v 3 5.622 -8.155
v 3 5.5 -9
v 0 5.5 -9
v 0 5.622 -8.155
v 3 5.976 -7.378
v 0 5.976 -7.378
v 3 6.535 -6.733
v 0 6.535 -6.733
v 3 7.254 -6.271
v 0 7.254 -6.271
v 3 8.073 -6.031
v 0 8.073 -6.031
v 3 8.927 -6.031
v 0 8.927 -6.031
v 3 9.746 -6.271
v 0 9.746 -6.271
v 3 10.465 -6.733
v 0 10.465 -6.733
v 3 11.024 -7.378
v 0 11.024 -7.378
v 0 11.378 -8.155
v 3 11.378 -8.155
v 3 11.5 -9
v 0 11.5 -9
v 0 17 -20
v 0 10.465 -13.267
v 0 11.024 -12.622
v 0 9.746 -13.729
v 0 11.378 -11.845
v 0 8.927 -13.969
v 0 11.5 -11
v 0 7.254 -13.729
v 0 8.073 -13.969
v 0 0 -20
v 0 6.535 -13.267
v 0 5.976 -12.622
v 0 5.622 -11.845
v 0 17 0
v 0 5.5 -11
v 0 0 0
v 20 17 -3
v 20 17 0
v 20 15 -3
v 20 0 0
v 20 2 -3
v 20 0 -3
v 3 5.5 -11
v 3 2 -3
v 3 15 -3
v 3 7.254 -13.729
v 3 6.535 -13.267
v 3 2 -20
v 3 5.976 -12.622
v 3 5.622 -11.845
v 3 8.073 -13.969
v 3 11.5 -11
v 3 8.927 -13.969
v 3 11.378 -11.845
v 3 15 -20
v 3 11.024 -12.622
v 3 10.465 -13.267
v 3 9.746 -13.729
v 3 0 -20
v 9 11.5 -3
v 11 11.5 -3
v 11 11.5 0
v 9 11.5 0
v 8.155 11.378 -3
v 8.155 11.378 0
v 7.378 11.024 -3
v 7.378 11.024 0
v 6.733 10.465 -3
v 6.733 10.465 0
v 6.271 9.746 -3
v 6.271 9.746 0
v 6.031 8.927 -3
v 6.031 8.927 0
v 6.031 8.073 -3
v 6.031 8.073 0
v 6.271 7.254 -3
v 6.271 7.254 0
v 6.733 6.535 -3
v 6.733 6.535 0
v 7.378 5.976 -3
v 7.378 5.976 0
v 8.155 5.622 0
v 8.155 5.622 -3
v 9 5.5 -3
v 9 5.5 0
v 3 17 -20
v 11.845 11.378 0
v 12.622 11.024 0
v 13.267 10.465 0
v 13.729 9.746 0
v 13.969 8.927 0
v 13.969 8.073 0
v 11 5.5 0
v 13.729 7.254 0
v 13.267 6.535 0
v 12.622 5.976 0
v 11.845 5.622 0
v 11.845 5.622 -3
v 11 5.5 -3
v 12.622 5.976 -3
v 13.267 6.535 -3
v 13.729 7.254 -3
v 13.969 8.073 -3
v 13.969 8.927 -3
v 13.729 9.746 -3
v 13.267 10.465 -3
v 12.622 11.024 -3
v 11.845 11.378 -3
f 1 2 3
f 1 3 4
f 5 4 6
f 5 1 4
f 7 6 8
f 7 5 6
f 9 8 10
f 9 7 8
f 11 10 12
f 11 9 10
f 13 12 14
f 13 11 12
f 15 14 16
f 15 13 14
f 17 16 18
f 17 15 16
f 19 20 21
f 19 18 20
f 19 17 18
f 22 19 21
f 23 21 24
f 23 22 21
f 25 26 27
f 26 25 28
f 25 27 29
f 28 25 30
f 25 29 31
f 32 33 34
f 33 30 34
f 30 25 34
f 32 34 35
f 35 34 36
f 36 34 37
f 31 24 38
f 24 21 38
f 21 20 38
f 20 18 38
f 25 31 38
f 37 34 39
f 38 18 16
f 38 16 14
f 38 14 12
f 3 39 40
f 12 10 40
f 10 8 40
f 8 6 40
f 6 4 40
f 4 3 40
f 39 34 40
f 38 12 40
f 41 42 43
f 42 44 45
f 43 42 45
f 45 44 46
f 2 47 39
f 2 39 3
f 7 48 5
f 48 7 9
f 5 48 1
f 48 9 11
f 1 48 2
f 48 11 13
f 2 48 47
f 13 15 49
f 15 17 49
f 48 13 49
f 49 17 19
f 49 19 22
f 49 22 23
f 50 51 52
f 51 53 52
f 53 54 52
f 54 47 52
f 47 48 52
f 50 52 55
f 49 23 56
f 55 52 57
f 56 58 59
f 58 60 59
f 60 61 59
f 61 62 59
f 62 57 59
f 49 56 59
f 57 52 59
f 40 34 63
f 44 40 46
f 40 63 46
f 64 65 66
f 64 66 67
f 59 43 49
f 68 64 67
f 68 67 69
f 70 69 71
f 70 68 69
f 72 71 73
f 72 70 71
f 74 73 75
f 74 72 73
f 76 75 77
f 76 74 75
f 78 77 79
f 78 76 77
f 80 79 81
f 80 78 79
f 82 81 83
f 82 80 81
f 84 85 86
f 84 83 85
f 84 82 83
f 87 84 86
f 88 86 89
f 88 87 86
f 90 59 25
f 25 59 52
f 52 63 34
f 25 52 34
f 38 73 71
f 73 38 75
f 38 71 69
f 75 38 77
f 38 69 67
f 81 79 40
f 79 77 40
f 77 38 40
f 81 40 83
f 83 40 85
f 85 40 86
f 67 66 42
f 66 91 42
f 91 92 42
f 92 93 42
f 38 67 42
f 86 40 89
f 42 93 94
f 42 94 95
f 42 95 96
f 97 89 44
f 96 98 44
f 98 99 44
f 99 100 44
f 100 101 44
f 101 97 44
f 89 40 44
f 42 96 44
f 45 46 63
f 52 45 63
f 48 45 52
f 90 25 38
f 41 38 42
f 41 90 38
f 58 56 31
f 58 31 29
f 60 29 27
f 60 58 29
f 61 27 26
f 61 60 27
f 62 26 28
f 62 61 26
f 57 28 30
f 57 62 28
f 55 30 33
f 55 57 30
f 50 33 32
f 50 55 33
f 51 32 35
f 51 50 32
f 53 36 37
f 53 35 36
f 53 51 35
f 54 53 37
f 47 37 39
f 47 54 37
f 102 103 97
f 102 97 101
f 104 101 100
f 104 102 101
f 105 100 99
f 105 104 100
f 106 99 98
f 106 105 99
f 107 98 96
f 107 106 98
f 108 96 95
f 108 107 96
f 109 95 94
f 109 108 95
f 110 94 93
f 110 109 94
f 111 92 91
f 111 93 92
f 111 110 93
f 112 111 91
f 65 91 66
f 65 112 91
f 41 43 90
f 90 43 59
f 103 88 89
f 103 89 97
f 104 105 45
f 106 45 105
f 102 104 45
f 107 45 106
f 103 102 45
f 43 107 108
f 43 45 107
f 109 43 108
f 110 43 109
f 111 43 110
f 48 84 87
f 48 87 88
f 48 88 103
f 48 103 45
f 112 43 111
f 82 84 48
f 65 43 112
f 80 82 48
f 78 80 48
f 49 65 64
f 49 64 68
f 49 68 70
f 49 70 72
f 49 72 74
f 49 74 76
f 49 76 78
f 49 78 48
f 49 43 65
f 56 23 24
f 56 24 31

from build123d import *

# Parameters (mm, degrees)
BOSS_EXTRUDE1_DEPTH = 17
SKETCH2_W           = 17
SKETCH2_H           = 13
CUT_EXTRUDE1_DEPTH  = 17
CUT_EXTRUDE2_REACH  = 5
CUT_EXTRUDE3_REACH  = 5


with BuildPart() as part:
    # Sketch1 → Boss-Extrude1 (new body)
    with BuildSketch(Plane(origin=(0, 0, 0), x_dir=(1, 0, 0), z_dir=(0, 1, 0))):
        Polygon((0, 0), (20, 0), (20, 3), (3, 20), (0, 20), align=None)
    extrude(amount=BOSS_EXTRUDE1_DEPTH)

    # Sketch2 → Cut-Extrude1 (cut)
    with BuildSketch(Plane(origin=(0, 0, -20), x_dir=(-1, 0, 0), z_dir=(0, 0, -1))):
        with Locations((-11.5, 8.5)):
            Rectangle(SKETCH2_W, SKETCH2_H)
    extrude(amount=-CUT_EXTRUDE1_DEPTH, mode=Mode.SUBTRACT)

    # Sketch3 → Cut-Extrude2 (cut, up to next)
    with BuildSketch(Plane(origin=(3, 0, 0), x_dir=(0, 0, -1), z_dir=(1, 0, 0)), mode=Mode.PRIVATE) as cut_extrude2_sk1:
        with BuildLine():
            Line((9, 11.5), (11, 11.5))
            ThreePointArc((11, 11.5), (14, 8.5), (11, 5.5))
            Line((11, 5.5), (9, 5.5))
            ThreePointArc((9, 5.5), (6, 8.5), (9, 11.5))
        make_face()
    cut_extrude2_tool1 = extrude(cut_extrude2_sk1.sketch, amount=-CUT_EXTRUDE2_REACH, mode=Mode.PRIVATE) & part.part
    add(cut_extrude2_tool1.solids().sort_by_distance((3, 8.5, -10))[0], mode=Mode.SUBTRACT)

    # Sketch4 → Cut-Extrude3 (cut, up to next)
    with BuildSketch(Plane(origin=(0, 0, -3), x_dir=(-1, 0, 0), z_dir=(0, 0, -1)), mode=Mode.PRIVATE) as cut_extrude3_sk1:
        with BuildLine():
            Line((-11, 11.5), (-9, 11.5))
            ThreePointArc((-9, 11.5), (-6, 8.5), (-9, 5.5))
            Line((-9, 5.5), (-11, 5.5))
            ThreePointArc((-11, 5.5), (-14, 8.5), (-11, 11.5))
        make_face()
    cut_extrude3_tool1 = extrude(cut_extrude3_sk1.sketch, amount=-CUT_EXTRUDE3_REACH, mode=Mode.PRIVATE) & part.part
    add(cut_extrude3_tool1.solids().sort_by_distance((10, 8.5, -3))[0], mode=Mode.SUBTRACT)


solid = part.part
